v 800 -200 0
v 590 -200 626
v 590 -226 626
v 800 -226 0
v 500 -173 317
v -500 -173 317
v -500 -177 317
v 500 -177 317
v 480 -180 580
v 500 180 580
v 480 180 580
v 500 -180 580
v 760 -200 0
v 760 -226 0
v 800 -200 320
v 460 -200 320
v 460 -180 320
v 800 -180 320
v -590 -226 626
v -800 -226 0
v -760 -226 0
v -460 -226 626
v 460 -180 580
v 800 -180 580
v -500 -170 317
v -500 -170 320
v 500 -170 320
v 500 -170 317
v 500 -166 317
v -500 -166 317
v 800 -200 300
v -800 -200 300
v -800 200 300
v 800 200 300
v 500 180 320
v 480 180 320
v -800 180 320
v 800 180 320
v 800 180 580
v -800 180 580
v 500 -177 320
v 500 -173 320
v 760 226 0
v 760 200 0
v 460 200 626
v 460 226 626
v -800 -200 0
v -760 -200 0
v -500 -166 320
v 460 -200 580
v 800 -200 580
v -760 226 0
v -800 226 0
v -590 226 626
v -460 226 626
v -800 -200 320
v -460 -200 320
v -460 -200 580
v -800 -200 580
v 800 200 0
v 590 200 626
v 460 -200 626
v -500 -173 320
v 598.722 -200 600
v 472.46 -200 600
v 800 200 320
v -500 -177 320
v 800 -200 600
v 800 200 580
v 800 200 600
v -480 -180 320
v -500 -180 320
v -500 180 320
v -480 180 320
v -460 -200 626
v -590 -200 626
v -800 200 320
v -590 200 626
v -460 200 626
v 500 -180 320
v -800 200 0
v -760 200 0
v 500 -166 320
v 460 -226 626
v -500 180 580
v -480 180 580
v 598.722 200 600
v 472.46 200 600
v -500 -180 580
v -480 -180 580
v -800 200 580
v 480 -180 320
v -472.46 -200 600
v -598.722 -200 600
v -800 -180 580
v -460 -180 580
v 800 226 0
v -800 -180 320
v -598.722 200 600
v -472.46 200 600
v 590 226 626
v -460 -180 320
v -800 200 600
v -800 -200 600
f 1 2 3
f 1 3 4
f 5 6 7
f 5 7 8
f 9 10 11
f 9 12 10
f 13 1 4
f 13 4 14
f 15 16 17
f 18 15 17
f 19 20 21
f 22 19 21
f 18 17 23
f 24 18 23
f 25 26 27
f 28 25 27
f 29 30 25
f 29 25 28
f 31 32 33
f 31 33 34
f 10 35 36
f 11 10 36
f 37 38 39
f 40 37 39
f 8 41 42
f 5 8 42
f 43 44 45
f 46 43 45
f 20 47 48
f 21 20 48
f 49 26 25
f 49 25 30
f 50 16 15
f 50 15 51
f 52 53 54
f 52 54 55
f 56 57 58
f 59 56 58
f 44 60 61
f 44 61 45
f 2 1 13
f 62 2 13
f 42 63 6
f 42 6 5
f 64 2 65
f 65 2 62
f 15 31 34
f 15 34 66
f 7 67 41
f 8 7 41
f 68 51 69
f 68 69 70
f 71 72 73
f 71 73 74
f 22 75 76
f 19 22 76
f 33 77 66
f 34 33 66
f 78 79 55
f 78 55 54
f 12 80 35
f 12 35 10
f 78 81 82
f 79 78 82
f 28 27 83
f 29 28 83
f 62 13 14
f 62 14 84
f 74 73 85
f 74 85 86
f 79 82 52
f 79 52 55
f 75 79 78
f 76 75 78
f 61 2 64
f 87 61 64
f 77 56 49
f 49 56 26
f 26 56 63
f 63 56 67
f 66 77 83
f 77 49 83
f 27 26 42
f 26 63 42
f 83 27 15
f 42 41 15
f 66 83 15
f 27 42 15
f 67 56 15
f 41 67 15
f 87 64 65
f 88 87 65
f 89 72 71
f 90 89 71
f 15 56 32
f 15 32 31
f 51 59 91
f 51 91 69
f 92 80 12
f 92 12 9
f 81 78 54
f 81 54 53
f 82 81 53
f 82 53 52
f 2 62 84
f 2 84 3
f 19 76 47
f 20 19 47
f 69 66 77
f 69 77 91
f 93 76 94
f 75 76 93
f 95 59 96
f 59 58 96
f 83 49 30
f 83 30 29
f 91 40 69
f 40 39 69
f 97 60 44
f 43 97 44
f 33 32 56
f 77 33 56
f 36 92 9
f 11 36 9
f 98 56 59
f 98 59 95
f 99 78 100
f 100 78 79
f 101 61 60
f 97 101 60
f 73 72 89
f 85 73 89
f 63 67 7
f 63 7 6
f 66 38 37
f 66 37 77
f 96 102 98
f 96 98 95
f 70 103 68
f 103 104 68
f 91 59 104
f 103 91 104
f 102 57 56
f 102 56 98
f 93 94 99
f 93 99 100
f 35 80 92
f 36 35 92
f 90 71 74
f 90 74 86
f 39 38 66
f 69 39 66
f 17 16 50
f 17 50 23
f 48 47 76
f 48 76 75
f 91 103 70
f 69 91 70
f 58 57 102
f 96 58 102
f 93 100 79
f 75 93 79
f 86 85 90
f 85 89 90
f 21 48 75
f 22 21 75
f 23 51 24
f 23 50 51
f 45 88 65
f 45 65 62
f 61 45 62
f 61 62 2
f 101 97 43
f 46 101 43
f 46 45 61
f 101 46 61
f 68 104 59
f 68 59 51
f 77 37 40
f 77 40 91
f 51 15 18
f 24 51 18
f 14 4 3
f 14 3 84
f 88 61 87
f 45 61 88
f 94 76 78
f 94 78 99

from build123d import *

# Parameters (mm, degrees)
F5_W           = 1600
F5_H           = 20
F6_DEPTH       = 200
F7_W           = 20
F7_H           = 260
F8_DEPTH       = 800
F9_W           = 20
F9_H           = 260
F10_DEPTH      = 180
F12_W          = 20
F12_H          = 260
F13_DEPTH      = 20
F13_DEPTH_BACK = 320
F15_W          = 1000
F15_H          = 4
F16_DEPTH      = 3
F18_DEPTH      = 26
F23_DEPTH      = 400


with BuildPart() as f6:
    # F5 (on Front) → F6 (new body, symmetric)
    with BuildSketch(Plane.XZ):
        with Locations((0, 590)):
            Rectangle(F5_W, F5_H)
    extrude(amount=F6_DEPTH, both=True)


with BuildPart() as f6b:
    # F5 (on Front) → F6, piece 2 (new body, symmetric)
    with BuildSketch(Plane.XZ):
        with Locations((0, 310)):
            Rectangle(F5_W, F5_H)
    extrude(amount=F6_DEPTH, both=True)

    # F15 (on face) → F16 (cut)
    with BuildSketch(Plane.XY.offset(320)):
        with Locations((0, -175)):
            Rectangle(F15_W, F15_H)
        with Locations((0, -168)):
            Rectangle(F15_W, F15_H)
    extrude(amount=-F16_DEPTH, mode=Mode.SUBTRACT)


with BuildPart() as f8:
    # F7 (on Right) → F8 (new body, symmetric)
    with BuildSketch(Plane.YZ):
        with Locations((190, 450)):
            Rectangle(F7_W, F7_H)
    extrude(amount=F8_DEPTH, both=True)


with BuildPart() as f10:
    # F9 (on Front) → F10 (new body, symmetric)
    with BuildSketch(Plane.XZ):
        with Locations((-490, 450)):
            Rectangle(F9_W, F9_H)
    extrude(amount=F10_DEPTH, both=True)


with BuildPart() as f11_1:
    # F11: instance of F10
    add(f10.part.mirror(Plane.YZ))


with BuildPart() as f13:
    # F12 (on face) → F13 (new body, two sides)
    with BuildSketch(Plane.YZ.offset(-480)) as f13_sk:
        with Locations((-190, 450)):
            Rectangle(F12_W, F12_H)
    extrude(amount=F13_DEPTH)
    extrude(f13_sk.sketch, amount=-F13_DEPTH_BACK)


with BuildPart() as f14_1:
    # F14: instance of F13
    add(f13.part.mirror(Plane.YZ))


with BuildPart() as f18:
    # F17 (on face) → F18 (new body)
    with BuildSketch(Plane.XZ.offset(200)):
        Polygon((-590, 626), (-800, 0), (-760, 0), (-460, 626), align=None)
    extrude(amount=F18_DEPTH)


with BuildPart() as f19_1:
    # F19: instance of F18
    add(f18.part.mirror(Plane.YZ))


with BuildPart() as f20_1:
    # F20: instance of F18
    add(f18.part.mirror(Plane.XZ))


with BuildPart() as f21_1:
    # F21: instance of F19_1
    add(f19_1.part.mirror(Plane.XZ))


with BuildPart() as f23:
    # F22 (on face) → F23 (new body, through all)
    with BuildSketch(Plane.XZ.offset(-200)):
        Polygon((-590, 626), (-598.7220447285, 600), (-472.4600638978, 600), (-460, 626), align=None)
    extrude(amount=F23_DEPTH)


with BuildPart() as f24_1:
    # F24: instance of F23
    add(f23.part.mirror(Plane.YZ))


solid = Compound([f6.part, f6b.part, f8.part, f10.part, f11_1.part, f13.part, f14_1.part, f18.part, f19_1.part, f20_1.part, f21_1.part, f23.part, f24_1.part])
